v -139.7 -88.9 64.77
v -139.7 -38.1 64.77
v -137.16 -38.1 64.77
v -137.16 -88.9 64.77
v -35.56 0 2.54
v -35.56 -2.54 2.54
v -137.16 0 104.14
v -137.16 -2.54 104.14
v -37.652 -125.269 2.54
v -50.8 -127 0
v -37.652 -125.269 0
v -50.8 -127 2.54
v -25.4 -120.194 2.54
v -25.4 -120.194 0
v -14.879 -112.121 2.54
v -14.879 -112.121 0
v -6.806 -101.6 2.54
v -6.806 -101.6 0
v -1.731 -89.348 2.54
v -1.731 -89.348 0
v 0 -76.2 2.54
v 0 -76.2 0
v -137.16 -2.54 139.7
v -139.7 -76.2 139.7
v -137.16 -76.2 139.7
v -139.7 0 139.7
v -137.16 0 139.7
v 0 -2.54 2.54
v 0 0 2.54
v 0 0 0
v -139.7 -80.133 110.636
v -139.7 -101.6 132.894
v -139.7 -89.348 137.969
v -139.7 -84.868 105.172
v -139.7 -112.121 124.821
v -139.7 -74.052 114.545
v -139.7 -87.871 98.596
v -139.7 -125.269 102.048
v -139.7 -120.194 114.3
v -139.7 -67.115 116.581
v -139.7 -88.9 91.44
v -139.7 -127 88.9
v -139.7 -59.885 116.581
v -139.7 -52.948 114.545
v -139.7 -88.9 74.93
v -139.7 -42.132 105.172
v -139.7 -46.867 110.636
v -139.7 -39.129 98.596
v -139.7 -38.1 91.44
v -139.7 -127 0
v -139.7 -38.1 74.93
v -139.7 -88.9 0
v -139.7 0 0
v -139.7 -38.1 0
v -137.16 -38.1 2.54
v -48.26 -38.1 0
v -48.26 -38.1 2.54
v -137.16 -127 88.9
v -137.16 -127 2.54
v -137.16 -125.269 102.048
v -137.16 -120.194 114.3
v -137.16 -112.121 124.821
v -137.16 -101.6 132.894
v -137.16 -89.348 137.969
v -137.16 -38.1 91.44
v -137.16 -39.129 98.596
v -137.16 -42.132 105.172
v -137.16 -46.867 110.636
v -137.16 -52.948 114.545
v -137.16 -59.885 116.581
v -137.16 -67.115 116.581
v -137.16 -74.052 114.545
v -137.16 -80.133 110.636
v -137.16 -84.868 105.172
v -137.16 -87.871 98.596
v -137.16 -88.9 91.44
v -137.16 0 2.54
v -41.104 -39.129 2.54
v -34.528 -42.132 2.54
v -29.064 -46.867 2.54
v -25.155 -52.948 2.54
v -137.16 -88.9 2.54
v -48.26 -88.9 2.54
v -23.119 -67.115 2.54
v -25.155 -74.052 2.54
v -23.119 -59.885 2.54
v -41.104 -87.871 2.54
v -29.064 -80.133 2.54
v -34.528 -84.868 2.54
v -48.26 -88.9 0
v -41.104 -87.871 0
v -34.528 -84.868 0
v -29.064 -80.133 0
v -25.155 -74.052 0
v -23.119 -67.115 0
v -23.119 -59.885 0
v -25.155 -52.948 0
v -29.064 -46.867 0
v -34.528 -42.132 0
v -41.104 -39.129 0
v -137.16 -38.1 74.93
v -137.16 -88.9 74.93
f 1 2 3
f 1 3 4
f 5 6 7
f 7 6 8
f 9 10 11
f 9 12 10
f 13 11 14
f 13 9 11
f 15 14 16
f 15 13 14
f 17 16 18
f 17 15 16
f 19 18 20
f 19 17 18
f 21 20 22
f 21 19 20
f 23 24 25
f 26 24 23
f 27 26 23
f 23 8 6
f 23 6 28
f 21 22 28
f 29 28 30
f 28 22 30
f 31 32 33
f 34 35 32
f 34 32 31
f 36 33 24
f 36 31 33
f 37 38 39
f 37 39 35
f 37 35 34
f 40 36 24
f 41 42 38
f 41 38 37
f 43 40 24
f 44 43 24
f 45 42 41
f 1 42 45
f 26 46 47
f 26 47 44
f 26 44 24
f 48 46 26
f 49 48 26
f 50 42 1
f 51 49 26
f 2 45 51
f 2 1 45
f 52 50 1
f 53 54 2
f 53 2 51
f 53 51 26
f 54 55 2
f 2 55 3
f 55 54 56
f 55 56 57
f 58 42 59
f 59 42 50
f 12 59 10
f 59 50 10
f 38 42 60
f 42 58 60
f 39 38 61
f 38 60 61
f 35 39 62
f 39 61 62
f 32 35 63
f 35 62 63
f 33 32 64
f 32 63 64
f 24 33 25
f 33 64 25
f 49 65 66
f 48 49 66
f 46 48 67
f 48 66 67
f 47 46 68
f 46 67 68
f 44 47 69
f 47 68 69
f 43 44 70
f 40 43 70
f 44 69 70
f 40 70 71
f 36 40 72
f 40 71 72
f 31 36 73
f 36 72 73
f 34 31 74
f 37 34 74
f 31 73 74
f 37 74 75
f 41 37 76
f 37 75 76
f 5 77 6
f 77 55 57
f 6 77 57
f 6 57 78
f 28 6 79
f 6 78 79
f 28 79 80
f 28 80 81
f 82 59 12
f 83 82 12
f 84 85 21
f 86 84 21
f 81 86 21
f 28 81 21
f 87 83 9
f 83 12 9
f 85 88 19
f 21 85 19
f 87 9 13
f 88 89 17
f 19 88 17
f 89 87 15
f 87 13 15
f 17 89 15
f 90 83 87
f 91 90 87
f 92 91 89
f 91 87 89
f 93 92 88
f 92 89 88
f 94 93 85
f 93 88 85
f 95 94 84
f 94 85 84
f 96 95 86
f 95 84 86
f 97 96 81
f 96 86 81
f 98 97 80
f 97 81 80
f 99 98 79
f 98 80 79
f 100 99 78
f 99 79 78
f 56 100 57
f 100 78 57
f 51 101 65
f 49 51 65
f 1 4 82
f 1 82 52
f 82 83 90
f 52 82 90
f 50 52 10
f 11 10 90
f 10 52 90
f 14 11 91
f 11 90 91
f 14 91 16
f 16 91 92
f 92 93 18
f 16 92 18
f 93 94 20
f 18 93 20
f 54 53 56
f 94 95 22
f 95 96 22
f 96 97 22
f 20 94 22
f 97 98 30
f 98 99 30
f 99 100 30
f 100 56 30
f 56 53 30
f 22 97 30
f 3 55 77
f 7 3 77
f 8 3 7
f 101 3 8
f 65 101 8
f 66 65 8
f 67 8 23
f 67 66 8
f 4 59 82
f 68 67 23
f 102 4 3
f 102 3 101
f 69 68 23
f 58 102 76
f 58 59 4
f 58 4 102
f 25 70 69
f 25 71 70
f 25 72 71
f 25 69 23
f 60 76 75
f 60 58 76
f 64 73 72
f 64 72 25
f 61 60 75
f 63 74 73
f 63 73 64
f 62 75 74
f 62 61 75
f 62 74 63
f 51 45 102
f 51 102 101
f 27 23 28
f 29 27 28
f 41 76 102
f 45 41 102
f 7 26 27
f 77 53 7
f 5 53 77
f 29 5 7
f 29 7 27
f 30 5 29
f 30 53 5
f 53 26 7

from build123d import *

# Parameters (mm, degrees)
F0_W      = 139.7
F0_H      = 127
F1_DEPTH  = 139.7
F2_W      = 137.16
F2_H      = 137.16
F3_DEPTH  = 124.46
F5_DEPTH  = 25.4
F7_DEPTH  = 25.4
F9_DEPTH  = 25.4
F11_DEPTH = 25.4
F12_R     = 50.8
F14_DEPTH = 2.54


with BuildPart() as f1:
    # F0 (on Top) → F1 (new body)
    with BuildSketch(Plane.XY):
        with Locations((-69.85, -63.5)):
            Rectangle(F0_W, F0_H)
    extrude(amount=F1_DEPTH)

    # F2 (on face) → F3 (cut)
    with BuildSketch(Plane.XZ.offset(127)):
        with Locations((-68.58, 71.12)):
            Rectangle(F2_W, F2_H)
    extrude(amount=-F3_DEPTH, mode=Mode.SUBTRACT)

    # F4 (on face) → F5 (cut)
    with BuildSketch(Plane.XZ.offset(2.54)):
        Polygon((-6.9185560569, 178.2889813185), (-137.16, 139.7), (0, 2.54), (55.8031983674, 142.7505463362), align=None)
    extrude(amount=-F5_DEPTH, mode=Mode.SUBTRACT)

    # F6 (on face) → F7 (cut)
    with BuildSketch(Plane.XZ.offset(2.54)):
        Polygon((-137.16, 104.14), (-137.16, 2.54), (-35.56, 2.54), align=None)
    extrude(amount=-F7_DEPTH, mode=Mode.SUBTRACT)

    # F8 (on face) → F9 (cut)
    with BuildSketch(Plane.XY.offset(2.54)):
        with BuildLine():
            Line((-137.16, -38.1), (-137.16, -88.9))
            Line((-137.16, -88.9), (-48.26, -88.9))
            ThreePointArc((-48.26, -88.9), (-22.86, -63.5), (-48.26, -38.1))
            Line((-48.26, -38.1), (-137.16, -38.1))
        make_face()
    extrude(amount=-F9_DEPTH, mode=Mode.SUBTRACT)

    # F10 (on face) → F11 (cut)
    with BuildSketch(Plane.YZ.offset(-137.16)):
        with BuildLine():
            Line((-38.1, 0), (-38.1, 2.54))
            Line((-38.1, 2.54), (-38.1, 91.44))
            ThreePointArc((-38.1, 91.44), (-63.5, 116.84), (-88.9, 91.44))
            Line((-88.9, 91.44), (-88.9, 2.54))
            Line((-88.9, 2.54), (-88.9, 0))
            Line((-88.9, 0), (-38.1, 0))
        make_face()
    extrude(amount=-F11_DEPTH, mode=Mode.SUBTRACT)

    # F12
    f12_edges = [f1.edges().sort_by_distance(p)[0] for p in [
        (0, -127, 1.27),
        (-138.43, -127, 139.7),
    ]]
    fillet(f12_edges, radius=F12_R)

    # F13 (on face) → F14 (join)
    with BuildSketch(Plane(origin=(-139.7, 0, 0), x_dir=(0, -1, 0), z_dir=(-1, 0, 0))):
        Polygon((38.1, 74.93), (38.1, 69.85), (38.1, 64.77), (88.9, 64.77), (88.9, 69.85), (88.9, 74.93), align=None)
    extrude(amount=-F14_DEPTH)


solid = f1.part
